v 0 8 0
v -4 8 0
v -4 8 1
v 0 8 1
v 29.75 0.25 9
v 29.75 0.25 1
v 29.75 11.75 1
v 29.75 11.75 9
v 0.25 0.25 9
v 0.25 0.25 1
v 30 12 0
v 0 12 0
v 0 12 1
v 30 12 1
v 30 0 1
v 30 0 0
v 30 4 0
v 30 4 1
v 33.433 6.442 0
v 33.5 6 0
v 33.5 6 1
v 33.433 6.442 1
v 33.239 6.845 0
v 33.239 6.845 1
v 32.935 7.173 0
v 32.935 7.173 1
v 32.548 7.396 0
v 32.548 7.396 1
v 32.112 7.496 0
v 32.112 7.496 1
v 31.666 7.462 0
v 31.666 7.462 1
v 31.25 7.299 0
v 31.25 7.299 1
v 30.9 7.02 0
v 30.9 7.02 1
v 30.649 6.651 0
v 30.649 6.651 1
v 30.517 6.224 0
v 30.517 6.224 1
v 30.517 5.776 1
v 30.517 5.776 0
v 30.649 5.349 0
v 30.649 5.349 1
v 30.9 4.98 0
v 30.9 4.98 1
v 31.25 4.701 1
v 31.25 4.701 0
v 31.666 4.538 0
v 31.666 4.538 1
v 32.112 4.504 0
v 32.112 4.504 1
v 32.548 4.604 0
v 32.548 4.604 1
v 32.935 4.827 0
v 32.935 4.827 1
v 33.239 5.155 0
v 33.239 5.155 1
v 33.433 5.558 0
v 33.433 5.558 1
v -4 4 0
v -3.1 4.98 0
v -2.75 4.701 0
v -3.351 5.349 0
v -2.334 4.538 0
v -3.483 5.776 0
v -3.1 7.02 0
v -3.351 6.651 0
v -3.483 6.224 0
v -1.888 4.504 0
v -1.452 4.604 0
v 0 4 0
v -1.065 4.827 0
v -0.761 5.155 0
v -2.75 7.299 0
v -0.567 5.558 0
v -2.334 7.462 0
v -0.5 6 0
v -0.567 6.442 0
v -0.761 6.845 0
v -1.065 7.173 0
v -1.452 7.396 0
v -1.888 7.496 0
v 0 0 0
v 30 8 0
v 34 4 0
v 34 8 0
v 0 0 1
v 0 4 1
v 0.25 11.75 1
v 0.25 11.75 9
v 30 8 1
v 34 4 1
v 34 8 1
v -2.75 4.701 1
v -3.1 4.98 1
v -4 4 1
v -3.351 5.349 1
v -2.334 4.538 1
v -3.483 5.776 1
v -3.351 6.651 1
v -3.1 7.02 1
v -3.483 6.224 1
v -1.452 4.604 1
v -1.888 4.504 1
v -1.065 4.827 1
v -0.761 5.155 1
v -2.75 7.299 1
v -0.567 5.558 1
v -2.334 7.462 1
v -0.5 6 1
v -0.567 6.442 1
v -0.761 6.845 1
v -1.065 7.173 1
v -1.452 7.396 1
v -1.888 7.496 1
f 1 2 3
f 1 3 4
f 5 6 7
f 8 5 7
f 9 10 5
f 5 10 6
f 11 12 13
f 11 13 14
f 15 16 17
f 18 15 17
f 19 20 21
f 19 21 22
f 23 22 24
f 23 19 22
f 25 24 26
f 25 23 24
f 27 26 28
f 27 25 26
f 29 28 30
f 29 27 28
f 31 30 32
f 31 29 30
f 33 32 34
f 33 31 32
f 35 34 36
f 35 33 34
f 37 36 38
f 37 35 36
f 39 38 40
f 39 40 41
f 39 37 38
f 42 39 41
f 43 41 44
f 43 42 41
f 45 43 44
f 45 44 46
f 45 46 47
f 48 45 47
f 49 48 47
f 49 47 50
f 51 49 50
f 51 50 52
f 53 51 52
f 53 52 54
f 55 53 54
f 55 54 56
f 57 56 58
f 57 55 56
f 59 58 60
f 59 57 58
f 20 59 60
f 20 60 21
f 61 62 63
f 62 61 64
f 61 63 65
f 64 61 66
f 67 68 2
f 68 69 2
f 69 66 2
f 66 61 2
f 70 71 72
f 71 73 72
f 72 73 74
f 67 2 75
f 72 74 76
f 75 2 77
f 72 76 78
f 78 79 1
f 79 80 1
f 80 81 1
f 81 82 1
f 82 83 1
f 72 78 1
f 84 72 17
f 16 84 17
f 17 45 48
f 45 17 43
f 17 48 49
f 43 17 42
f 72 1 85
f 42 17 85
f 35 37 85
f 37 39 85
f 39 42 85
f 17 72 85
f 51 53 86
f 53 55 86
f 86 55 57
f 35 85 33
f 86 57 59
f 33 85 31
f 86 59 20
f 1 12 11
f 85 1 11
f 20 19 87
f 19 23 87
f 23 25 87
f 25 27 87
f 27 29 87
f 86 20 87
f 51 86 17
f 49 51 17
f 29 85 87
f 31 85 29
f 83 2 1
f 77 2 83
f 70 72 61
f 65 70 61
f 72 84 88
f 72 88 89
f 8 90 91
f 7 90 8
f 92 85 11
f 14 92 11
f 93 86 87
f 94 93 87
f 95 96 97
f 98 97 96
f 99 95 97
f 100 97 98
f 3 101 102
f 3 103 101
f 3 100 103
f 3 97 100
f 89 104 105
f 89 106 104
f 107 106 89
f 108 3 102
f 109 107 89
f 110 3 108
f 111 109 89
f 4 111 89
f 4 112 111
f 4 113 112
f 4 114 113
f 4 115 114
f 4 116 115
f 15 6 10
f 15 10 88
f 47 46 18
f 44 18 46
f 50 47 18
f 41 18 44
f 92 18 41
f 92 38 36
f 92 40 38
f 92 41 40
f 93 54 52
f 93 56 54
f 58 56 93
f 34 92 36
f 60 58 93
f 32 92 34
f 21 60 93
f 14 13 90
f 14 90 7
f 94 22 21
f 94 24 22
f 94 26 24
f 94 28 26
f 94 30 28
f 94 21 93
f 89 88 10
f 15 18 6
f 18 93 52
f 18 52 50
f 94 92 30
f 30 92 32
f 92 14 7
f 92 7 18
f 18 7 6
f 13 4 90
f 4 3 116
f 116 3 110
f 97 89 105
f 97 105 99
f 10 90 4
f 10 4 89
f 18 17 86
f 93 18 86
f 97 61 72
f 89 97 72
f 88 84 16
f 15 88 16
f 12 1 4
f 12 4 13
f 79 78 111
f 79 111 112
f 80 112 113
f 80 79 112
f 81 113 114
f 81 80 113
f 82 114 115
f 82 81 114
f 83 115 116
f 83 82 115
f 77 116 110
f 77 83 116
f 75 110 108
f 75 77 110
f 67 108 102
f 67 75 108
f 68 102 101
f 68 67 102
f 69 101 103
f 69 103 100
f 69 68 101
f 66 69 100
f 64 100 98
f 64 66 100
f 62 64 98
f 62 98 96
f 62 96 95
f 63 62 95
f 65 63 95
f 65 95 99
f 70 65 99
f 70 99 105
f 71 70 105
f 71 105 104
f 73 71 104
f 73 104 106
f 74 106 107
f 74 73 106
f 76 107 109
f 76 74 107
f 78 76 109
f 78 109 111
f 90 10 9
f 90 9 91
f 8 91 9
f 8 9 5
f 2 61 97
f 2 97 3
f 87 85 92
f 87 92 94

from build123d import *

# Parameters (mm, degrees)
SCHIZZO1_W                   = 4
SCHIZZO1_H                   = 4
SCHIZZO1_R                   = 1.5
SCHIZZO1_W_2                 = 30
SCHIZZO1_H_2                 = 12
ESTRUSIONE_ESTRUSIONE1_DEPTH = 1
SCHIZZO2_W                   = 29.5
SCHIZZO2_H                   = 11.5
ESTRUSIONE_ESTRUSIONE2_DEPTH = 8


with BuildPart() as part:
    # Schizzo1 → Estrusione-Estrusione1 (new body)
    # profile 1 of 3: a face of its own
    with BuildSketch(Plane.XY):
        with Locations((-2, 6)):
            Rectangle(SCHIZZO1_W, SCHIZZO1_H)
        with Locations((-2, 6)):
            Circle(SCHIZZO1_R, mode=Mode.SUBTRACT)
    # profile 2 of 3: a face of its own
    with BuildSketch(Plane.XY):
        with Locations((15, 6)):
            Rectangle(SCHIZZO1_W_2, SCHIZZO1_H_2)
    # profile 3 of 3: a face of its own
    with BuildSketch(Plane.XY):
        with Locations((32, 6)):
            Rectangle(SCHIZZO1_W, SCHIZZO1_H)
        with Locations((32, 6)):
            Circle(SCHIZZO1_R, mode=Mode.SUBTRACT)
    extrude(amount=ESTRUSIONE_ESTRUSIONE1_DEPTH)

    # Schizzo2 → Estrusione-Estrusione2 (add)
    with BuildSketch(Plane.XY.offset(1)):
        with Locations((15, 6)):
            Rectangle(SCHIZZO2_W, SCHIZZO2_H)
    extrude(amount=ESTRUSIONE_ESTRUSIONE2_DEPTH)


solid = part.part
